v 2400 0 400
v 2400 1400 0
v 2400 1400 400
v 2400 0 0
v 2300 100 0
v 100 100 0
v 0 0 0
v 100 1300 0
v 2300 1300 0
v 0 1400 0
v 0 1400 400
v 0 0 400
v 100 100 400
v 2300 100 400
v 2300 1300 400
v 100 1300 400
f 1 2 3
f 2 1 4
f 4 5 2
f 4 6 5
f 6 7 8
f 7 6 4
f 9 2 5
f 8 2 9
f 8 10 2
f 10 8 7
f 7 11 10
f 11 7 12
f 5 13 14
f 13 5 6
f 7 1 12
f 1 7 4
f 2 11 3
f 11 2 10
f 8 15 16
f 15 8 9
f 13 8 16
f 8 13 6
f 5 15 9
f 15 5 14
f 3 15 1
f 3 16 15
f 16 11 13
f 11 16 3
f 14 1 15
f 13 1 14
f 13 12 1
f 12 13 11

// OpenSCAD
// Generated from plan.json; millimetres. Not a structural design.
// Open in OpenSCAD. Increase explode_mm to inspect courses.
explode_mm = 0;
$fn = 24;
show_fixing_paths = false;

// first-bed-01-C1-S
translate([0, 0, 0+0*explode_mm])
  color([0.70,0.52,0.33]) cube([2400, 100, 200]);
// first-bed-01-C1-N
translate([0, 1300, 0+0*explode_mm])
  color([0.70,0.52,0.33]) cube([2400, 100, 200]);
// first-bed-01-C1-W
translate([0, 100, 0+0*explode_mm])
  color([0.70,0.52,0.33]) cube([100, 1200, 200]);
// first-bed-01-C1-E
translate([2300, 100, 0+0*explode_mm])
  color([0.70,0.52,0.33]) cube([100, 1200, 200]);
// first-bed-01-C2-S
translate([100, 0, 200+1*explode_mm])
  color([0.70,0.52,0.33]) cube([2200, 100, 200]);
// first-bed-01-C2-N
translate([100, 1300, 200+1*explode_mm])
  color([0.70,0.52,0.33]) cube([2200, 100, 200]);
// first-bed-01-C2-W
translate([0, 0, 200+1*explode_mm])
  color([0.70,0.52,0.33]) cube([100, 1400, 200]);
// first-bed-01-C2-E
translate([2300, 0, 200+1*explode_mm])
  color([0.70,0.52,0.33]) cube([100, 1400, 200]);
if (show_fixing_paths) translate([50.0, 1400, 50.0+0*explode_mm]) rotate([90,0,0]) color([0.8,0.1,0.1]) cylinder(d=7, h=150);
if (show_fixing_paths) translate([50.0, 1400, 150.0+0*explode_mm]) rotate([90,0,0]) color([0.8,0.1,0.1]) cylinder(d=7, h=150);
if (show_fixing_paths) translate([2350.0, 1400, 50.0+0*explode_mm]) rotate([90,0,0]) color([0.8,0.1,0.1]) cylinder(d=7, h=150);
if (show_fixing_paths) translate([2350.0, 1400, 150.0+0*explode_mm]) rotate([90,0,0]) color([0.8,0.1,0.1]) cylinder(d=7, h=150);
if (show_fixing_paths) translate([50.0, 0, 50.0+0*explode_mm]) rotate([-90,0,0]) color([0.8,0.1,0.1]) cylinder(d=7, h=150);
if (show_fixing_paths) translate([50.0, 0, 150.0+0*explode_mm]) rotate([-90,0,0]) color([0.8,0.1,0.1]) cylinder(d=7, h=150);
if (show_fixing_paths) translate([2350.0, 0, 50.0+0*explode_mm]) rotate([-90,0,0]) color([0.8,0.1,0.1]) cylinder(d=7, h=150);
if (show_fixing_paths) translate([2350.0, 0, 150.0+0*explode_mm]) rotate([-90,0,0]) color([0.8,0.1,0.1]) cylinder(d=7, h=150);
if (show_fixing_paths) translate([2400, 50.0, 250.0+1*explode_mm]) rotate([0,-90,0]) color([0.8,0.1,0.1]) cylinder(d=7, h=150);
if (show_fixing_paths) translate([2400, 50.0, 350.0+1*explode_mm]) rotate([0,-90,0]) color([0.8,0.1,0.1]) cylinder(d=7, h=150);
if (show_fixing_paths) translate([2400, 1350.0, 250.0+1*explode_mm]) rotate([0,-90,0]) color([0.8,0.1,0.1]) cylinder(d=7, h=150);
if (show_fixing_paths) translate([2400, 1350.0, 350.0+1*explode_mm]) rotate([0,-90,0]) color([0.8,0.1,0.1]) cylinder(d=7, h=150);
if (show_fixing_paths) translate([2350.0, 200.0, 400+1*explode_mm]) rotate([180,0,0]) color([0.8,0.1,0.1]) cylinder(d=7, h=250);
if (show_fixing_paths) translate([2350.0, 700.0, 400+1*explode_mm]) rotate([180,0,0]) color([0.8,0.1,0.1]) cylinder(d=7, h=250);
if (show_fixing_paths) translate([2350.0, 1200.0, 400+1*explode_mm]) rotate([180,0,0]) color([0.8,0.1,0.1]) cylinder(d=7, h=250);
if (show_fixing_paths) translate([300.0, 1350.0, 400+1*explode_mm]) rotate([180,0,0]) color([0.8,0.1,0.1]) cylinder(d=7, h=250);
if (show_fixing_paths) translate([900.0, 1350.0, 400+1*explode_mm]) rotate([180,0,0]) color([0.8,0.1,0.1]) cylinder(d=7, h=250);
if (show_fixing_paths) translate([1500.0, 1350.0, 400+1*explode_mm]) rotate([180,0,0]) color([0.8,0.1,0.1]) cylinder(d=7, h=250);
if (show_fixing_paths) translate([2100.0, 1350.0, 400+1*explode_mm]) rotate([180,0,0]) color([0.8,0.1,0.1]) cylinder(d=7, h=250);
if (show_fixing_paths) translate([300.0, 50.0, 400+1*explode_mm]) rotate([180,0,0]) color([0.8,0.1,0.1]) cylinder(d=7, h=250);
if (show_fixing_paths) translate([900.0, 50.0, 400+1*explode_mm]) rotate([180,0,0]) color([0.8,0.1,0.1]) cylinder(d=7, h=250);
if (show_fixing_paths) translate([1500.0, 50.0, 400+1*explode_mm]) rotate([180,0,0]) color([0.8,0.1,0.1]) cylinder(d=7, h=250);
if (show_fixing_paths) translate([2100.0, 50.0, 400+1*explode_mm]) rotate([180,0,0]) color([0.8,0.1,0.1]) cylinder(d=7, h=250);
if (show_fixing_paths) translate([0, 50.0, 250.0+1*explode_mm]) rotate([0,90,0]) color([0.8,0.1,0.1]) cylinder(d=7, h=150);
if (show_fixing_paths) translate([0, 50.0, 350.0+1*explode_mm]) rotate([0,90,0]) color([0.8,0.1,0.1]) cylinder(d=7, h=150);
if (show_fixing_paths) translate([0, 1350.0, 250.0+1*explode_mm]) rotate([0,90,0]) color([0.8,0.1,0.1]) cylinder(d=7, h=150);
if (show_fixing_paths) translate([0, 1350.0, 350.0+1*explode_mm]) rotate([0,90,0]) color([0.8,0.1,0.1]) cylinder(d=7, h=150);
if (show_fixing_paths) translate([50.0, 200.0, 400+1*explode_mm]) rotate([180,0,0]) color([0.8,0.1,0.1]) cylinder(d=7, h=250);
if (show_fixing_paths) translate([50.0, 700.0, 400+1*explode_mm]) rotate([180,0,0]) color([0.8,0.1,0.1]) cylinder(d=7, h=250);
if (show_fixing_paths) translate([50.0, 1200.0, 400+1*explode_mm]) rotate([180,0,0]) color([0.8,0.1,0.1]) cylinder(d=7, h=250);
